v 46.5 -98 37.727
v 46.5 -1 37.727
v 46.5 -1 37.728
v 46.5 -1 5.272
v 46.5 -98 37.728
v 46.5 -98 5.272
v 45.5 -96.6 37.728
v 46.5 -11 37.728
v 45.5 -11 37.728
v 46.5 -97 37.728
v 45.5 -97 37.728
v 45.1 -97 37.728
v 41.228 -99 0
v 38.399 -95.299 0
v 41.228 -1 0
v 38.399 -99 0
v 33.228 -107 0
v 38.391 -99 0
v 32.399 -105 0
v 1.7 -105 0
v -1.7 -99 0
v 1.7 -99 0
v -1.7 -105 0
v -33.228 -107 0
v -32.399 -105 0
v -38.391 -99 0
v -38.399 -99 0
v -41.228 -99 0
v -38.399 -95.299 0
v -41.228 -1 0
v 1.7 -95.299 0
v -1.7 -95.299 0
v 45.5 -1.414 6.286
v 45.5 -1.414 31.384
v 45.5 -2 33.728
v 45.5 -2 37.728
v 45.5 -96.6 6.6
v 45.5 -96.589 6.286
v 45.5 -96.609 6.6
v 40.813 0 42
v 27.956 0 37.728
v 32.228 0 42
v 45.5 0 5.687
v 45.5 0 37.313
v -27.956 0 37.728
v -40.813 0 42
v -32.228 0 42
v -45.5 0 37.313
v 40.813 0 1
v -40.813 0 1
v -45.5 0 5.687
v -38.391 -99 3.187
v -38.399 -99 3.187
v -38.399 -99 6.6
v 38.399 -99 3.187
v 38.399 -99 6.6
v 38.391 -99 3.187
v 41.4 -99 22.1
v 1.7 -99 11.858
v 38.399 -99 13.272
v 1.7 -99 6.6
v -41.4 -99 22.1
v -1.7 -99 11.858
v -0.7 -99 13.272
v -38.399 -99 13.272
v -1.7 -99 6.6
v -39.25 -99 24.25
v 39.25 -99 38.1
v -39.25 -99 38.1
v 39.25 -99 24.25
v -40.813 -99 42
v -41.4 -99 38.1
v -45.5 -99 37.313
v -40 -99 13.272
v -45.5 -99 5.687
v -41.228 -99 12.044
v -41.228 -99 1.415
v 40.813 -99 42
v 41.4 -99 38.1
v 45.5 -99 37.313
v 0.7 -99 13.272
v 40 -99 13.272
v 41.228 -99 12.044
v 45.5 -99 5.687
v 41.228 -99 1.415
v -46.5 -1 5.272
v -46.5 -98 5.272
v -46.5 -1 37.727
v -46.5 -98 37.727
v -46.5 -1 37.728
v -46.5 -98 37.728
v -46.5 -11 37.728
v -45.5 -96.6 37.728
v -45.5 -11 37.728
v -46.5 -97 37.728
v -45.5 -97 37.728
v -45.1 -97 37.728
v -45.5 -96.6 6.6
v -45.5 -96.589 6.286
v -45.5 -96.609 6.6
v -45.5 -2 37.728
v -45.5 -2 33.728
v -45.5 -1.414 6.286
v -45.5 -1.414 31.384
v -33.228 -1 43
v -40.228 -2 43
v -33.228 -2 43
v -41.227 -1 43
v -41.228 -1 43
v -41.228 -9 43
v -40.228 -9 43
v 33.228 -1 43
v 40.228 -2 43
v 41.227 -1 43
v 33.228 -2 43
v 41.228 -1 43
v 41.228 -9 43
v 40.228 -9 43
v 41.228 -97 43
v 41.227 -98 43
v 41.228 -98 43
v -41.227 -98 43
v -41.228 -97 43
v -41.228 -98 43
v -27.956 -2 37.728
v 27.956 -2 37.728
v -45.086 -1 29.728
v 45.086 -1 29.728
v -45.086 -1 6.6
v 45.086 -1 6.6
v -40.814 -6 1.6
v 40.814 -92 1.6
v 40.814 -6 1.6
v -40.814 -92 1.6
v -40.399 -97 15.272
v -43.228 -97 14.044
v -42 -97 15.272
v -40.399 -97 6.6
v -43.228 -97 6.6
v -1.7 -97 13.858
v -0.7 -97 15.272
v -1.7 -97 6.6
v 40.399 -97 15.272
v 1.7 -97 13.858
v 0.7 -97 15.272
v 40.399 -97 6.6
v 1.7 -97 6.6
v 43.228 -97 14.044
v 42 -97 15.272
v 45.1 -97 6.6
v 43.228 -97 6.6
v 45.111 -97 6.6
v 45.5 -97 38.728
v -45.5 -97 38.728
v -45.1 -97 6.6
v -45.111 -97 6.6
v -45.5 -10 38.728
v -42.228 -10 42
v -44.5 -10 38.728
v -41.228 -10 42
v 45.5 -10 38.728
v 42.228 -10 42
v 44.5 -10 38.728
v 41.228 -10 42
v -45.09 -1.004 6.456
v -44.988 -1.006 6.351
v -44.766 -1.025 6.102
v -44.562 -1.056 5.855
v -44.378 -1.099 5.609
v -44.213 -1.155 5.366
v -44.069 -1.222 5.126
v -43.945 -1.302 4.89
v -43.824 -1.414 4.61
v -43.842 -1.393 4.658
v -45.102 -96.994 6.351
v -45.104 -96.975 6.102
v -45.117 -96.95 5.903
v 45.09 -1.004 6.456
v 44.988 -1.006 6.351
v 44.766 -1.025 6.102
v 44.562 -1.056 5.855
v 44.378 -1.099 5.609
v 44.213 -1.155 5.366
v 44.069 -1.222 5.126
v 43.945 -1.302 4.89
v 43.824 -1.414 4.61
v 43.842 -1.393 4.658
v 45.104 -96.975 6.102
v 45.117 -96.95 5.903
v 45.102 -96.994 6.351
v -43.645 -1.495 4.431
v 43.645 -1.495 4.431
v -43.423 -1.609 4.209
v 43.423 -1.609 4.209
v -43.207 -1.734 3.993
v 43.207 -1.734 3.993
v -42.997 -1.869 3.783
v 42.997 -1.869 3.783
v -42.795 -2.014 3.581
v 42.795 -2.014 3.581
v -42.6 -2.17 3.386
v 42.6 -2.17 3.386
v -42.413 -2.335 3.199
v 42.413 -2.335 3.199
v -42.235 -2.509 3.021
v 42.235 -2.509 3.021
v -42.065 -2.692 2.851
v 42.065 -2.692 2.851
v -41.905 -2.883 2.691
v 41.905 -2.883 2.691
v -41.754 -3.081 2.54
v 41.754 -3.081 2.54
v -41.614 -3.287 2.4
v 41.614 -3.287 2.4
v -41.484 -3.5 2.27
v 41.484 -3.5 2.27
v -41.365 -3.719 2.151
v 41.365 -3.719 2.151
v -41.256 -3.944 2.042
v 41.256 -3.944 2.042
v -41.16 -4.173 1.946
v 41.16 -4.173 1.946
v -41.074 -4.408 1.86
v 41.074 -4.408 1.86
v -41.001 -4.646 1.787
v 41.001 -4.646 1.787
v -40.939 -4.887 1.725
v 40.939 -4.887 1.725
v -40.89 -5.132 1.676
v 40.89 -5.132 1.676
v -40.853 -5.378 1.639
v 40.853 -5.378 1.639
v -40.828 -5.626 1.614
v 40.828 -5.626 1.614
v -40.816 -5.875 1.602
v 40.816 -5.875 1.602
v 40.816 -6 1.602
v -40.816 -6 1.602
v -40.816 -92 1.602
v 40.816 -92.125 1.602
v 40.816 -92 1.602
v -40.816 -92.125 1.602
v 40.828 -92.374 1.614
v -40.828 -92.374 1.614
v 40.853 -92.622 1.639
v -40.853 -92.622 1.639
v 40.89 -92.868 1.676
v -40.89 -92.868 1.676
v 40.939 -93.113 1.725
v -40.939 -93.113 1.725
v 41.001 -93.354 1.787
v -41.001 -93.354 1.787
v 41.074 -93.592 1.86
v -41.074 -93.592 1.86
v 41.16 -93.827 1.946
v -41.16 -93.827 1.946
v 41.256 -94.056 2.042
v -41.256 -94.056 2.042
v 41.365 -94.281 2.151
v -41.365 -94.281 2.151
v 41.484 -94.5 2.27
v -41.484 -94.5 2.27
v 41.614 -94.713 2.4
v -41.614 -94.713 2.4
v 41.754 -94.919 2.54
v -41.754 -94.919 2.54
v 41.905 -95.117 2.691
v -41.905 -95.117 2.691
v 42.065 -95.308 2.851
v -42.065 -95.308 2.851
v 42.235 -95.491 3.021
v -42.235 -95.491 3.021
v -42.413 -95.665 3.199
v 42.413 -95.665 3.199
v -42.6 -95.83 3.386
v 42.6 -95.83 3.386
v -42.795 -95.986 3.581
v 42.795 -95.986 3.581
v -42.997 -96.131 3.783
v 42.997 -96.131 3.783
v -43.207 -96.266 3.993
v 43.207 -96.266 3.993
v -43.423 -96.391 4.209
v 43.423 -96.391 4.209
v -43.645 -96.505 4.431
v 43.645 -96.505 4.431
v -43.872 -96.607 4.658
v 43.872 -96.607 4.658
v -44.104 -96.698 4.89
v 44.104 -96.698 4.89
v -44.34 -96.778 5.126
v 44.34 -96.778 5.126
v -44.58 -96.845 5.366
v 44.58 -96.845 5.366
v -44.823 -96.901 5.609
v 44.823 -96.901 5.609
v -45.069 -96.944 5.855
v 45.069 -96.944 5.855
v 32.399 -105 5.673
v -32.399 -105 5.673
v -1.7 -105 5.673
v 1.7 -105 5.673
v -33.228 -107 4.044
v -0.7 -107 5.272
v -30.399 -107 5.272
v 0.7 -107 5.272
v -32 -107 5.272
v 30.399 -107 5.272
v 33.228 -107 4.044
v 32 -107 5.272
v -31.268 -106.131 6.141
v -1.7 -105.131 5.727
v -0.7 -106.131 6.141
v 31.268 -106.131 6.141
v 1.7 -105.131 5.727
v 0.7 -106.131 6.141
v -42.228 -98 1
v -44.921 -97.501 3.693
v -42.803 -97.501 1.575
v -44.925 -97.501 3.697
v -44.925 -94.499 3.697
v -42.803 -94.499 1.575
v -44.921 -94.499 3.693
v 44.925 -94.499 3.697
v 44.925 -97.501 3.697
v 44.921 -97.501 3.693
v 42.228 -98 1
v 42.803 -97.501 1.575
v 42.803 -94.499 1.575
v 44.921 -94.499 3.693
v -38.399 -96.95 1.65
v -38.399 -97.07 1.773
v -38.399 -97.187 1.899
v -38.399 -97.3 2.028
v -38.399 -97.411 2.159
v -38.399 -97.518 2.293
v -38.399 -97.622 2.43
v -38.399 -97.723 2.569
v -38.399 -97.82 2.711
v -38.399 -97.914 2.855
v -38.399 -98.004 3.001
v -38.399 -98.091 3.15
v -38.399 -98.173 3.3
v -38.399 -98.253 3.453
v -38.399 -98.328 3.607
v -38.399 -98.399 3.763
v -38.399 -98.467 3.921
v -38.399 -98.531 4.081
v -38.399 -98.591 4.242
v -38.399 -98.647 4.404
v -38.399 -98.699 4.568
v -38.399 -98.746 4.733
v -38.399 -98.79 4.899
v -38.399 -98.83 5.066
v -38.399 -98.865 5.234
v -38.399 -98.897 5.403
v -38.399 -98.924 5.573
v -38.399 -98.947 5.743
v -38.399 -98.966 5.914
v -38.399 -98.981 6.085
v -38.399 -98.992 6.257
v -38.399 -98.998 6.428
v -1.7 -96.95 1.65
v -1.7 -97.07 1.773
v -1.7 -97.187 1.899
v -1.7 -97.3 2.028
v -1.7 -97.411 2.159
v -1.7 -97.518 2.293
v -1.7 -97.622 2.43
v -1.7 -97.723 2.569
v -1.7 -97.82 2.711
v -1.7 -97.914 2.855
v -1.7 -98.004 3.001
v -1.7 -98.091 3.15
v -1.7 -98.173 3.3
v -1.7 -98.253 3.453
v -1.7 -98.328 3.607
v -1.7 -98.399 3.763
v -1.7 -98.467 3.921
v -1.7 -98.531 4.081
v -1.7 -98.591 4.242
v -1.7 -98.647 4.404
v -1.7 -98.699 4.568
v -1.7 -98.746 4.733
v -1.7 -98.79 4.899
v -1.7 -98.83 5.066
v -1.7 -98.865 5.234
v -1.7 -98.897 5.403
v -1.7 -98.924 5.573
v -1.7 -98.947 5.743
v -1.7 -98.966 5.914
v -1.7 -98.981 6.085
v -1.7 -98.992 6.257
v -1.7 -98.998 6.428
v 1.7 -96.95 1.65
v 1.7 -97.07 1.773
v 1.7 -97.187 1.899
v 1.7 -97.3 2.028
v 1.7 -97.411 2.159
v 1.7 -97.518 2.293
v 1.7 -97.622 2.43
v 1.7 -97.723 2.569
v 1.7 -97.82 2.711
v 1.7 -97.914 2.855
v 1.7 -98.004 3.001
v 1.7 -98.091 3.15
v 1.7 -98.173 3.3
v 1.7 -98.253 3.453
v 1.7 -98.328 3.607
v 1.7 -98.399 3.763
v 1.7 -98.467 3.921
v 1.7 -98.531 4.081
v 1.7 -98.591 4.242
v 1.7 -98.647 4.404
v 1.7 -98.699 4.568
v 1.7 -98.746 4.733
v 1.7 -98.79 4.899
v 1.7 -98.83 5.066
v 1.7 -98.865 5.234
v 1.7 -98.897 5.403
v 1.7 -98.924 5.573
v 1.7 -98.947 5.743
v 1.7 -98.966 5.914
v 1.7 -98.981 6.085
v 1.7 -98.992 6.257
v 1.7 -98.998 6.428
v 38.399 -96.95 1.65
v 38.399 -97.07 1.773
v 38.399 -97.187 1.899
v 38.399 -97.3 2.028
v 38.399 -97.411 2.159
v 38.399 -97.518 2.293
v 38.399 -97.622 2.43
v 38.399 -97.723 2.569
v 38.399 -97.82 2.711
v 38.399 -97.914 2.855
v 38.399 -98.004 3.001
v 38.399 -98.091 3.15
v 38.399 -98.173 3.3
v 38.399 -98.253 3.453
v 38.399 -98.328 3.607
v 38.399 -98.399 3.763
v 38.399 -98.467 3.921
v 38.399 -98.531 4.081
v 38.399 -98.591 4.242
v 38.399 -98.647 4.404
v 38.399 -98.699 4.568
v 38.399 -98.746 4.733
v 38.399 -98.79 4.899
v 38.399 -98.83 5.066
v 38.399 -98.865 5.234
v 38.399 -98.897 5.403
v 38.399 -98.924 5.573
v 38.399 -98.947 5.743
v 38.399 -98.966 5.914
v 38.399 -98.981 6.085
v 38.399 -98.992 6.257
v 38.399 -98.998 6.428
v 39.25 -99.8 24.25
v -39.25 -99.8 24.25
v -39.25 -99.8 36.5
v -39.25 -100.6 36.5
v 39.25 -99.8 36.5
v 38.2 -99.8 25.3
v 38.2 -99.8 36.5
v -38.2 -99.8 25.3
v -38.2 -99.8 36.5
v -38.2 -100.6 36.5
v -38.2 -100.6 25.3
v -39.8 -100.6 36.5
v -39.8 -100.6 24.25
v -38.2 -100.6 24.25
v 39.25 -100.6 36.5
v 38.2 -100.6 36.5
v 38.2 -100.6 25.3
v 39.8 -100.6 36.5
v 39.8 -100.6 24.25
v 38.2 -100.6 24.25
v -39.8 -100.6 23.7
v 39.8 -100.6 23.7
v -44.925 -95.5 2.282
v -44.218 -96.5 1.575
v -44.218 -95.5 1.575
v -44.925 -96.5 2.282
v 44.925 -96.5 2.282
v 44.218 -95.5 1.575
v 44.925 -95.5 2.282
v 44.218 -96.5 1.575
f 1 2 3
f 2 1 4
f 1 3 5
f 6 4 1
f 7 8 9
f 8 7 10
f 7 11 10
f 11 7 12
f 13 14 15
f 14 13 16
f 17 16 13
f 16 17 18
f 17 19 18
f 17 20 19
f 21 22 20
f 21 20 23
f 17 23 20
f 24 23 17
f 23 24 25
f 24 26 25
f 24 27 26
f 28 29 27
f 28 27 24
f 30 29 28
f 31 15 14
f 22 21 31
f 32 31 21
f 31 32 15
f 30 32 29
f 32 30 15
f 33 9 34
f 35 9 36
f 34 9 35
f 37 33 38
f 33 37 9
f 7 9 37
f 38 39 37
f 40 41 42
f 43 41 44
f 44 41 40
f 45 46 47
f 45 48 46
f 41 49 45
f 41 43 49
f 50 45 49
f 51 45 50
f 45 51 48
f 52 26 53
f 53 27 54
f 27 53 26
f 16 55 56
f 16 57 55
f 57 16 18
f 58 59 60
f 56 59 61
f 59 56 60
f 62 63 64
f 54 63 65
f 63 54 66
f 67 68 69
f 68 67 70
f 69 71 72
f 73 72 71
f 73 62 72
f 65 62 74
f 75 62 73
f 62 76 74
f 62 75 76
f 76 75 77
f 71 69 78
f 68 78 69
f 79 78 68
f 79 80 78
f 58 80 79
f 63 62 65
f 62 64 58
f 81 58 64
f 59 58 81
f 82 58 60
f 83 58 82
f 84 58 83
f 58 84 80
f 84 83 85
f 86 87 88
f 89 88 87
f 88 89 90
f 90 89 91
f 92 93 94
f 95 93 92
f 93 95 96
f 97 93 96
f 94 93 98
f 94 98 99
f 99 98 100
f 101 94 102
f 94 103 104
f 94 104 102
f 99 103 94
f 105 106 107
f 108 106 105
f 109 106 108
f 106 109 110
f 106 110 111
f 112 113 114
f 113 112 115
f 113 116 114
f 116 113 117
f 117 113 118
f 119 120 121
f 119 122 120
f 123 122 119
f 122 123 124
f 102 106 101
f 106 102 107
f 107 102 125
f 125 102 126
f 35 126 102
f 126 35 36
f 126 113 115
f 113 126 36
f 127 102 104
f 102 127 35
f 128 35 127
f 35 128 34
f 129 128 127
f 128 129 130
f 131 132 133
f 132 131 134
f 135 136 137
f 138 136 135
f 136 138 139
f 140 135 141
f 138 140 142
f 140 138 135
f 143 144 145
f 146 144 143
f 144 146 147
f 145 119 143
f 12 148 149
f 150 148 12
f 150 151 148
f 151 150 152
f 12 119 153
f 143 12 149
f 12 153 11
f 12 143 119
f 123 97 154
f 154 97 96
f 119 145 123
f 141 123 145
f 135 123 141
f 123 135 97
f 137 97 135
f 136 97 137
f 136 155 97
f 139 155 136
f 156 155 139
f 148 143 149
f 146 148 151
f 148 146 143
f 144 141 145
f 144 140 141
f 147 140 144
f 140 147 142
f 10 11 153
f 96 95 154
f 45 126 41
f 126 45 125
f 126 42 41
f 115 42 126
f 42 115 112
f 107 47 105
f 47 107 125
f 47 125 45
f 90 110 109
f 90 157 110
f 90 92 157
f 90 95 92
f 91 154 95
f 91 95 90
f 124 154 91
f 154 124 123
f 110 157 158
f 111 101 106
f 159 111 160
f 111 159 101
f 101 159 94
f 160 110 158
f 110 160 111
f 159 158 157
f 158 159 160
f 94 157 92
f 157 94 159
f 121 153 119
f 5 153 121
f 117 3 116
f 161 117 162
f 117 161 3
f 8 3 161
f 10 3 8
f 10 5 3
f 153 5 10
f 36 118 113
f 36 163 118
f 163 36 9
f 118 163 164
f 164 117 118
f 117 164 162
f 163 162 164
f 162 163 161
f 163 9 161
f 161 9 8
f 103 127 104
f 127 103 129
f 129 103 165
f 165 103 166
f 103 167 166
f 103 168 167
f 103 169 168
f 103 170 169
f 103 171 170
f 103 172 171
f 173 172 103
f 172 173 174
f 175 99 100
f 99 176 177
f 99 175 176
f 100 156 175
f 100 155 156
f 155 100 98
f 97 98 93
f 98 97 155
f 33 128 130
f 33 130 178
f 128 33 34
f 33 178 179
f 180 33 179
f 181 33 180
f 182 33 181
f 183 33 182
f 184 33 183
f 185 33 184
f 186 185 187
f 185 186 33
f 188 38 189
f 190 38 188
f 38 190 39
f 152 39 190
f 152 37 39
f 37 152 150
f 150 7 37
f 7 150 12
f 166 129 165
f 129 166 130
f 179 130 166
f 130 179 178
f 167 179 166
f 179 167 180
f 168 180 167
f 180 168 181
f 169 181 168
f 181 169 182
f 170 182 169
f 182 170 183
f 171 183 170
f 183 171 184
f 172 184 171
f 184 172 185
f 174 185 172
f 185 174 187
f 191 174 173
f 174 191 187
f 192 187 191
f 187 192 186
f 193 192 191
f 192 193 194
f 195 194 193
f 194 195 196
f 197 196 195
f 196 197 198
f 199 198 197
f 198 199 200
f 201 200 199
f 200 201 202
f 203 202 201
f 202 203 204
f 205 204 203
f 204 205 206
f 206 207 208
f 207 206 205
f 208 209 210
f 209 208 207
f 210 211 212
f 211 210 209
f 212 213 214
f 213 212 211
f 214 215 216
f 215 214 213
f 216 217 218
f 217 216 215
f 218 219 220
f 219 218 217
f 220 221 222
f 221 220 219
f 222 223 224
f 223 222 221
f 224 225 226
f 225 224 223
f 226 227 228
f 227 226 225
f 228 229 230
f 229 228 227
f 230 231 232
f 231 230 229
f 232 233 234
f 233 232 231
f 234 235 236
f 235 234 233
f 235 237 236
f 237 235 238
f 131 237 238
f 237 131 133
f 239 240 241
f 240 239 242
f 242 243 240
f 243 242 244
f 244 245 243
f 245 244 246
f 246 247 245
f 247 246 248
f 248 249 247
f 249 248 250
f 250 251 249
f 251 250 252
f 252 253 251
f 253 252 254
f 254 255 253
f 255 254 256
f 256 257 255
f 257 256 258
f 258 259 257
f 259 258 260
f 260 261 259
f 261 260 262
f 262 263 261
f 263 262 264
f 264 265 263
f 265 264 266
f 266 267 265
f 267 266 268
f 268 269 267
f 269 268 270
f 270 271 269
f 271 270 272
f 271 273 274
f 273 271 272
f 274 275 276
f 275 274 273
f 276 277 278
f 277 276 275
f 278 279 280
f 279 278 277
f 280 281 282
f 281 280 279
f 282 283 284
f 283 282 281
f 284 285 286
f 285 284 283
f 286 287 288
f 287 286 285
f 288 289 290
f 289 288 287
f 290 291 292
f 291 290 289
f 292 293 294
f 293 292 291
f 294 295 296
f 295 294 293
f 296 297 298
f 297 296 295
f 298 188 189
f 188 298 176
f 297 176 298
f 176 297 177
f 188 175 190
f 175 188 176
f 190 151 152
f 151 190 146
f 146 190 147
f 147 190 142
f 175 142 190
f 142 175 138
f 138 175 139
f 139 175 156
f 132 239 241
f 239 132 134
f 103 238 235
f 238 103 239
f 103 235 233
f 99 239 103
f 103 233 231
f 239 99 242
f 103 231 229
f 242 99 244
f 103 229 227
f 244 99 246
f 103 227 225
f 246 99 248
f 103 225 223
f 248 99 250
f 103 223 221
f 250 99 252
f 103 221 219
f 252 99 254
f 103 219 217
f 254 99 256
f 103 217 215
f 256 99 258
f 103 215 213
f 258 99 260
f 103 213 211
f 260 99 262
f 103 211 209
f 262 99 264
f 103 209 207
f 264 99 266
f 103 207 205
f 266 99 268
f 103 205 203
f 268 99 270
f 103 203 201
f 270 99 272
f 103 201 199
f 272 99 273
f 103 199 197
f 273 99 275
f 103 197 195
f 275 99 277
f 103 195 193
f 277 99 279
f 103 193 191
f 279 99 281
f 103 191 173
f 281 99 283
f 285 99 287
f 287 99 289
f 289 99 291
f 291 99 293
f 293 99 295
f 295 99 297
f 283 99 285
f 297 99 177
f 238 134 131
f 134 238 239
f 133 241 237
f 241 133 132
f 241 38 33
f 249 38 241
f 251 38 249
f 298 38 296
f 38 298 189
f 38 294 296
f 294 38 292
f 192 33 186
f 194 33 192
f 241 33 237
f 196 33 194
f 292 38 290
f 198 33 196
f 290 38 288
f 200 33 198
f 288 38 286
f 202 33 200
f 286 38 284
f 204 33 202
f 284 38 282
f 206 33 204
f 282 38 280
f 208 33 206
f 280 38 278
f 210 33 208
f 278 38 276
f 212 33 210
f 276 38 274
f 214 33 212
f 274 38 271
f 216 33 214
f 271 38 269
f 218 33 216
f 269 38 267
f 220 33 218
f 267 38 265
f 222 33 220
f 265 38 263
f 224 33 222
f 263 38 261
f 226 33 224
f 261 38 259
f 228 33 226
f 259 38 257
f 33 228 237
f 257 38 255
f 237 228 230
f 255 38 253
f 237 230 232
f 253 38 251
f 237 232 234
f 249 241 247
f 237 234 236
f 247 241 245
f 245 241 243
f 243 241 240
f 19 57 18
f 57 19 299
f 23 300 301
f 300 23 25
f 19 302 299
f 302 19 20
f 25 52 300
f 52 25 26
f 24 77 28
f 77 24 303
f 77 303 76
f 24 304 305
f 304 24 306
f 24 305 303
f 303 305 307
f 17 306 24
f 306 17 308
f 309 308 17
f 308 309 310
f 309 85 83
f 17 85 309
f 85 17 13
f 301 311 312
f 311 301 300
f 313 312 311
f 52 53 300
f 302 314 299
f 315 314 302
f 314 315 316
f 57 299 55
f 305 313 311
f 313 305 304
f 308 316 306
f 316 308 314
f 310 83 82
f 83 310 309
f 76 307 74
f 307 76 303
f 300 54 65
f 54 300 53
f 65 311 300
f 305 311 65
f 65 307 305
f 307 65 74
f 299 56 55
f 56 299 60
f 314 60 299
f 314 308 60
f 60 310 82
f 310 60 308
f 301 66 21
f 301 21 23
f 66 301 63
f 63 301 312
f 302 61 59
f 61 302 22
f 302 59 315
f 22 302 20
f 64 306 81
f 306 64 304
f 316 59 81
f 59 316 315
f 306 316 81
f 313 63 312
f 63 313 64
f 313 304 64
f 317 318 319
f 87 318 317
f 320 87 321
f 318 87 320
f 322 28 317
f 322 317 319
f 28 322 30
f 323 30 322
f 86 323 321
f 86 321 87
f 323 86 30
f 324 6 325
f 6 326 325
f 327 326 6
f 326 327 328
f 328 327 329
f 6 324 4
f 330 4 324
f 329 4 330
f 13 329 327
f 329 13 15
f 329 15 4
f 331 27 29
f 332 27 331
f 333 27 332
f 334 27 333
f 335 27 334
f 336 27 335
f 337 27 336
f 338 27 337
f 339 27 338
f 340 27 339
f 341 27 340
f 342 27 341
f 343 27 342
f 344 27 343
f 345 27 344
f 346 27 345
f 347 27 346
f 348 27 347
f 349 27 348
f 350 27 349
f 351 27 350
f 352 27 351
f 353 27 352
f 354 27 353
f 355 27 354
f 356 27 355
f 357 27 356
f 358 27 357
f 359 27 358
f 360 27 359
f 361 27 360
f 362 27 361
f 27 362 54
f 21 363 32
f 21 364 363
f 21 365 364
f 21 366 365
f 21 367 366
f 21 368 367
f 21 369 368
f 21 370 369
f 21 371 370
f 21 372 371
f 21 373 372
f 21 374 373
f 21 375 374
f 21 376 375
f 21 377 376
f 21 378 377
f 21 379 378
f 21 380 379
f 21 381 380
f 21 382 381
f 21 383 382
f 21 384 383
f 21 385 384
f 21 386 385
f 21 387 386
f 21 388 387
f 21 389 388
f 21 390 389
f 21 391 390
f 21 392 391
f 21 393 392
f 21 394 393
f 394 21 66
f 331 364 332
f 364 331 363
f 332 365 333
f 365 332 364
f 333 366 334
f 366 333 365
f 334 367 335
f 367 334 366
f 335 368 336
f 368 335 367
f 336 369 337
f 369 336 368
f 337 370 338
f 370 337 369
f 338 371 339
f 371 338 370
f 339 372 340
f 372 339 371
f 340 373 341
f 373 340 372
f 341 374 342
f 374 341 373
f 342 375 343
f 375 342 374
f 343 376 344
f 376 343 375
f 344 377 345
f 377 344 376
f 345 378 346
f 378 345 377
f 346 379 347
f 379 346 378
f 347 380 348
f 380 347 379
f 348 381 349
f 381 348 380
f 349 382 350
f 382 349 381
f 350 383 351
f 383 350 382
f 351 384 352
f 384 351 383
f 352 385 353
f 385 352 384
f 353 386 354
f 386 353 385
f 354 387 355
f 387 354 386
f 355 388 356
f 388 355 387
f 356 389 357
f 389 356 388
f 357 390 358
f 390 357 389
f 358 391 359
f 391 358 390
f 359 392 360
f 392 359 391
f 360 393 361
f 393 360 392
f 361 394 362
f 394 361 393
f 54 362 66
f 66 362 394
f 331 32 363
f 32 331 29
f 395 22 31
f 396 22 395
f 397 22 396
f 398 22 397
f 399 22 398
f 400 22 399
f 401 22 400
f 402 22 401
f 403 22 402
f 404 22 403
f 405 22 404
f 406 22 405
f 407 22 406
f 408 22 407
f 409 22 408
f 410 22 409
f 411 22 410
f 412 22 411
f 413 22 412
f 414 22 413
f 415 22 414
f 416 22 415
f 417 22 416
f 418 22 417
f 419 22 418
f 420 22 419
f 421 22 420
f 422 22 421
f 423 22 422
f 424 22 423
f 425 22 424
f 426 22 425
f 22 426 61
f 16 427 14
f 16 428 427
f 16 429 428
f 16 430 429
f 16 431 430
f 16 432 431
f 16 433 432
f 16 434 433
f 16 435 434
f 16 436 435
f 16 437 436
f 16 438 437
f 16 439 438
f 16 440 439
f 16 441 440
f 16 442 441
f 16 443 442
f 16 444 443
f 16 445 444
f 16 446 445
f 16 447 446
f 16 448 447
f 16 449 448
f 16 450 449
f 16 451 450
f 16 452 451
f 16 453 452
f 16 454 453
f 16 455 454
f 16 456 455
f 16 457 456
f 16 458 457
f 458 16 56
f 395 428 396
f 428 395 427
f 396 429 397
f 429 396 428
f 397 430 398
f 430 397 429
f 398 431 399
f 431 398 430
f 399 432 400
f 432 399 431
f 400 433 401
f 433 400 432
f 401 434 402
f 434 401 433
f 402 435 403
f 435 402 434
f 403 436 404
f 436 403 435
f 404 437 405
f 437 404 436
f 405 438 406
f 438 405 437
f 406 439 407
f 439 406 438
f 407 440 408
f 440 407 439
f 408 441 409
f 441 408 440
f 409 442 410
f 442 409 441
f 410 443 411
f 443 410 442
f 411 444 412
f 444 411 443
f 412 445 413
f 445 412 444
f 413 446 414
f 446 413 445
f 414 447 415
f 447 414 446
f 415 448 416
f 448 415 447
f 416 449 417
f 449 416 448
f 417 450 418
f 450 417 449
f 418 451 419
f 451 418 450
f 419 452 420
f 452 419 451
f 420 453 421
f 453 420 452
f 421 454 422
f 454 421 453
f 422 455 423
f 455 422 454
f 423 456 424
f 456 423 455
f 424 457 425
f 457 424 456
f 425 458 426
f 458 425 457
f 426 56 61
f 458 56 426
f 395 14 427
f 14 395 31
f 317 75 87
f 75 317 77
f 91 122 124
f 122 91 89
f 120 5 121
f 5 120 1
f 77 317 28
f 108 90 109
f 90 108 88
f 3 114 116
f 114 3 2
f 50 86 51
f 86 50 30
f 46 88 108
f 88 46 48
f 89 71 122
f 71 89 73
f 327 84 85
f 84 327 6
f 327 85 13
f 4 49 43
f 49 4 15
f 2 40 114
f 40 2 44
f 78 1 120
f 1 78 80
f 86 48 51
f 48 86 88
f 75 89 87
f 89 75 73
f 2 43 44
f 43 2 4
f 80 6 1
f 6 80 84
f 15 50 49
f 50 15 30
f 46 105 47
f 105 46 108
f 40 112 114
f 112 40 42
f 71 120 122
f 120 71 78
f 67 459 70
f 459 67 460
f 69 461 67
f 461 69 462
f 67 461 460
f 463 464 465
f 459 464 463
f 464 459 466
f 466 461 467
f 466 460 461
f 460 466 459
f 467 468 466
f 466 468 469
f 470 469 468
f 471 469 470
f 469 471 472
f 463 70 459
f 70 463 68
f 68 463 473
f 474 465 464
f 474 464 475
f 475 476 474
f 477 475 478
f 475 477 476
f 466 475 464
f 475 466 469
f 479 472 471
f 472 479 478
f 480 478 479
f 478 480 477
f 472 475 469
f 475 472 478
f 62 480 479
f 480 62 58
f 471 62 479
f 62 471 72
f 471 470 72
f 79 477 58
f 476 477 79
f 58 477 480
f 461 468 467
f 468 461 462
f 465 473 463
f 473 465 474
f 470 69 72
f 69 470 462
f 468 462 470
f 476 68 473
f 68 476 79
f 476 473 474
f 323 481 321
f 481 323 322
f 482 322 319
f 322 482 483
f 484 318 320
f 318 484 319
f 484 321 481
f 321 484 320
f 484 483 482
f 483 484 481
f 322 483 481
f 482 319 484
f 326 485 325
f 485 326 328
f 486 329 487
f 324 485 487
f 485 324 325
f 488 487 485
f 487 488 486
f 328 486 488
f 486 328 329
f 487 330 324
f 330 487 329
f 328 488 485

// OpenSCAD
// MultiBin Simple Drawer - parametric remake
// Reverse-engineered from MultiBoard's official "MultiBin Simple Drawer" STLs so that
// matching configurations reproduce the originals; every other configuration follows
// the same rules (50 mm grid per LU, identical wall, lip, label, scoop and magnet
// geometry). Paste this whole file into MakerWorld's Parametric Model Maker.
//
// Drawer orientation: X = width, Y = depth (front toward -Y), Z = height.
// Centered on X; back face at Y = 0; base at Z = 0.

/* [Size (in 50 mm layout units)] */
// Drawer width in LU
width_lu = 2; // [1:0.5:12]
// Drawer depth in LU
depth_lu = 2; // [1:0.5:12]
// Drawer height in LU
height_lu = 1; // [0.5:0.5:12]

/* [Compartments] */
// Number of width-wise sections (columns)
width_sections = 1; // [1:12]
// Number of depth-wise sections (rows)
depth_sections = 1; // [1:12]
// Divider height in LU (clamped to the wall height)
divider_height_lu = 12; // [0.5:0.5:12]

/* [Features] */
// Magnet pocket(s) in the back wall (thickens the back wall to 4 mm)
magnet = false;
// Label holder on the front face
label = "large"; // [none, small, large]

/* [Hidden] */
$fs = 0.25;
$fa = 1;
eps = 0.01;
hs  = 0.0005;   // hull-slab thickness: keeps lofted faces on their nominal planes

U  = 50;                        // one layout unit
W  = max(1, width_lu);
D  = max(1, depth_lu);
H  = max(0.5, height_lu);

OW   = U*W - 7;                 // outer width
half = OW/2;
OH   = U*H - 7;                 // outer height
WT   = OH - 5.272;              // side/back wall + divider top height
F    = -(U*D - 1);              // front wall outer face (Y)
LIPF = F - 8;                   // lip plate front face (Y)

// Feature gates: the label frame and the magnet pocket need a minimum height;
// on shorter drawers they are omitted (with a warning) instead of emitting
// broken geometry.
lab_on = (label != "none") && (OH >= 30);
mag_on = magnet && (OH >= 35.5);

floor_t   = 1.6;                // floor thickness
wall_s    = 1.0;                // side wall thickness
wall_b    = mag_on ? 4.0 : 1.0; // back wall base thickness
wall_f    = 2.0;                // front wall thickness
lean0     = WT - 8;             // back wall starts thickening to 2 mm here
lean1     = WT - 4;             // back wall reaches 2 mm here
fil_r     = 5;                  // interior floor fillet radius (front/back/dividers)
fil_cz    = floor_t + fil_r;    // fillet center height (6.6)
side_ch   = 4.686;              // interior side-wall floor chamfer leg
bot_ch    = 5.272;              // outer side bottom chamfer leg
frt_r     = 7;                  // outer front-bottom fillet radius
scoop_hw  = 2.956;              // scoop flat extends this far past the outer cell centers
brace_len = min(8*H + 2, U*D - 5);  // corner brace flange length, clamped to the depth
div_t     = 1.0;                // divider thickness
div_top   = min(WT, U*divider_height_lu - 12.272); // divider top height

n_cells = max(1, floor(W + eps));                 // full 50 mm cells across the width
cell_c  = [for (i = [0:1:n_cells-1]) (i - (n_cells-1)/2) * U];       // cell centers
cell_b  = n_cells < 2 ? [] :
          [for (i = [0:1:n_cells-2]) (cell_c[i] + cell_c[i+1]) / 2]; // cell boundaries

n_grooves = max(0, floor((WT - 3) / U + eps));    // internal 50 mm height boundaries

// Left-hand X face of every width divider. Both the dividers themselves and the
// front-bottom fillet cut read this, so they cannot drift apart.
function divider_x() =
    width_sections < 2 ? [] :
    let (cavL = -(half - wall_s), cavR = half - wall_s,
         cw = (cavR - cavL - (width_sections - 1)*div_t) / width_sections)
    [for (i = [1:1:width_sections - 1]) cavL + i*cw + (i - 1)*div_t];

label_cells = (lab_on && label == "large") ? min(2, n_cells) : 1;
lab_win  = 13.2  + 25*(label_cells-1);  // window half width
lab_chan = 14.25 + 25*(label_cells-1);  // card channel half width
lab_foot = 16.4  + 25*(label_cells-1);  // rail outboard half width at the wall face
lab_p    = 1.6;                         // frame protrusion in front of the wall face

if (label != "none" && !lab_on)
    echo("WARNING: the label holder needs a drawer at least 1 LU tall; label omitted.");
if (magnet && !mag_on)
    echo("WARNING: the magnet pocket needs a drawer at least 1 LU tall; magnet omitted.");
if (lab_on && label == "large" && n_cells < 2)
    echo("NOTE: large label needs a drawer at least 2 LU wide; using the 1-cell frame.");

// ------------------------------------------------------------------ helpers

// 2D polygon in the (Y,Z) plane extruded along +X from x0 to x1
module prismX(pts, x0, x1) {
    translate([x0, 0, 0]) rotate([90, 0, 90])
        linear_extrude(height = x1 - x0) polygon(pts);
}
// 2D polygon in the (X,Z) plane extruded along +Y from y0 to y1  (y0 < y1)
module prismY(pts, y0, y1) {
    translate([0, y1, 0]) rotate([90, 0, 0])
        linear_extrude(height = y1 - y0) polygon(pts);
}
// thin slab of an (X,Z) polygon at depth y (for hull()-based 45-degree lofts)
module slabY(pts, y) { prismY(pts, y - eps, y + eps); }
// thin slab of a (Y,Z) polygon at position x
module slabX(pts, x) { prismX(pts, x - eps, x + eps); }

// ------------------------------------------------------------------ core parts

// back wall (Y,Z) profile, including the top lean and the brace inner face
back_prof = mag_on ?
    [[0, 1], [0, OH], [-2, OH], [-4, WT], [-4, 0], [-1, 0]] :
    [[0, 1], [0, OH], [-2, OH], [-2, lean1], [-1, lean0], [-1, 0]];

module back_wall() {
    difference() {
        prismX(back_prof, -half, half);
        for (k = [1:1:n_grooves]) groove_cut(k*U);
    }
}
// the inward-jogged wall panels behind the grooves; added after the cavity cut
module groove_bumps() {
    if (!mag_on) for (k = [1:1:n_grooves]) groove_bump(k*U);
}
// (X,Z) octagon spanning x0..x1, z0..z1 with 45-degree corner chamfer legs
function oct_xz(x0, x1, z0, z1, leg) = [
    [x0, z0 + leg], [x0 + leg, z0], [x1 - leg, z0], [x1, z0 + leg],
    [x1, z1 - leg], [x1 - leg, z1], [x0 + leg, z1], [x0, z1 - leg]];

// outer groove at height zk: an octagonal recess, 1 mm deep, lofted between
// its outer-face outline and its floor outline (60-degree drafts all around)
// The 45-degree corner legs shrink with depth at 1.015 per mm (measured), the
// same law the side-wall jog windows use.
module groove_cut(zk) {
    hull() {
        prismY(oct_xz(-(half - 5), half - 5, zk - 8.5, zk + 1.5, 2.929), 0, hs);
        prismY(oct_xz(-(half - 6.732), half - 6.732, zk - 6.768, zk - 0.232, 1.914), -1 - hs, -1);
    }
}
// matching inward-jogged wall panel: the shell offset of the groove (measured)
module groove_bump(zk) {
    hull() {
        prismY(oct_xz(-(half - 4.732), half - 4.732, zk - 8.768, zk + 1.768, 3.086), -1 - hs, -1);
        prismY(oct_xz(-(half - 6.464), half - 6.464, zk - 7.036, zk + 0.036, 2.071), -2, -2 + hs);
    }
}

// side-wall jog window polygon in (Y,Z), at inset d from the outer face (d in 0..1).
// Same numbers as the back-wall groove: 60-degree drafts on every edge, and plain
// 45-degree corner chamfers with equal legs (measured from the originals).
function jog_w(zk, d) =
    let (y0 = -5 - 1.732*d,          // back edge (max y)
         y1 = F + 5 + 1.732*d,       // front edge (min y)
         zA = zk - 8.5 + 1.732*d, zB = zk + 1.5 - 1.732*d,
         leg = 2.929 - 1.015*d)
    [[y0, zA + leg], [y0 - leg, zA], [y1 + leg, zA], [y1, zA + leg],
     [y1, zB - leg], [y1 + leg, zB], [y0 - leg, zB], [y0, zB - leg]];

// one side wall (sx = +1 / -1) with its jog windows
module side_wall(sx) {
    scale([sx, 1, 1])
        difference() {
            translate([half - wall_s, F, 0]) cube([wall_s, -F, WT]);
            for (k = [1:1:n_grooves]) hull() {
                prismX(jog_w(k*U, 0), half, half + hs);
                prismX(jog_w(k*U, 1), half - 1, half - 1 + hs);
            }
        }
}
// the inward-jogged side wall panels: the shell offset of the jog window (measured).
// The back corners are 45 degrees; the front corners are cut at about 52.4 degrees
// in plan (legs 3.308 in Z against 2.550 in Y at the base), and every edge carries
// the same 60 degree draft through the 1 mm panel thickness.
function jog_in(zk, d) =
    let (y0 = -4.732 - 1.732*d,      // the whole panel sits shifted +0.268 in Y
         y1 = F + 5.268 + 1.732*d,
         zA = zk - 8.768 + 1.732*d, zB = zk + 1.768 - 1.732*d,
         leg = 3.086 - 1.015*d,
         fz  = 3.308 - 1.142*d,
         fy  = 2.550 - 0.880*d)
    [[y0, zA + leg], [y0 - leg, zA], [y1 + fy, zA], [y1, zA + fz],
     [y1, zB - fz], [y1 + fy, zB], [y0 - leg, zB], [y0, zB - leg]];
module side_jog_panels() {
    for (sx = [-1, 1]) scale([sx, 1, 1])
        for (k = [1:1:n_grooves]) hull() {
            prismX(jog_in(k*U, 0), half - 1 - hs, half - 1);
            prismX(jog_in(k*U, 1), half - 2, half - 2 + hs);
        }
}

module front_wall() { translate([-half, F, 0]) cube([OW, wall_f, OH]); }
module floor_slab() { translate([-half, F, 0]) cube([OW, -F, floor_t]); }

// back corner braces: 1 mm arm leaning 45 degrees inward, with a flange along the side
module corner_braces() {
    for (sx = [-1, 1]) scale([sx, 1, 1]) intersection() {
        // leaning band (X,Z) extruded along Y
        // The band runs 0.5 below the wall top so it overlaps the wall instead of
        // meeting it face to face; the overhang past x = half is clipped away by the
        // flange profile below, and the rest lies inside the side wall.
        prismY([[half - (OH + 1 - WT), OH + 1], [half + 0.5, WT - 0.5],
                [half - wall_s + 0.5, WT - 0.5], [half - wall_s - (OH + 1 - WT), OH + 1]],
               -(brace_len + 2), 0);
        // Bounded in Y by the flange end with its 45-degree chamfers. The profile runs
        // 1 below the wall top so the leaning band above does the clipping; ending it
        // exactly on WT made the two coincide and left a knife edge there, which
        // float32 binary STL export collapses into a non-manifold sliver.
        prismX([[1, WT - 1], [1, OH + 1], [-(brace_len - 2), OH + 1], [-brace_len, OH - 1],
                [-brace_len, WT + 1], [-(brace_len + 2), WT - 1]], 0, half);
    }
}

// ------------------------------------------------------------------ cutters

module cavity() {
    mainB = mag_on ? -4 : -2;   // rear boundary of the main cavity box
    translate([-(half - wall_s), F + wall_f, floor_t])
        cube([OW - 2*wall_s, -(F + wall_f) + mainB, OH + 10 - floor_t]);
    if (!mag_on) {
        translate([-(half - wall_s), -2, floor_t])
            cube([OW - 2*wall_s, 1, lean0 - floor_t]);
        prismX([[-1, lean0], [-2, lean1], [-2, lean0]],
               -(half - wall_s), half - wall_s);
    }
}
// solid fillet bar along X at wall face y = yw, bulging toward dir (re-added after cavity)
module fillet_barX(x0, x1, yw, dir) {
    translate([x0, yw, 0]) rotate([90, 0, 90]) linear_extrude(height = x1 - x0)
        difference() {
            polygon([[0, floor_t], [dir*fil_r, floor_t], [dir*fil_r, fil_cz], [0, fil_cz]]);
            translate([dir*fil_r, fil_cz]) circle(r = fil_r);
        }
}

// Back-wall finger scoop. On every original the flat ends 18.544 short of the side
// wall, which for whole-LU widths is identical to the outer cell centres +/-2.956.
// Driving it from the half-width instead reproduces those exactly and keeps the
// same shoulder on half-LU widths, where cell centres alone would leave the scoop
// 12.5 too narrow at each end.
module scoop_cut() {
    x1 = half - 18.544; x0 = -x1;
    rise = OH - WT + 2;
    prismY([[x0, WT], [x1, WT], [x1 + rise, WT + rise], [x0 - rise, WT + rise]], -7, 1);
}

module outer_edge_cuts() {
    // side bottom chamfers (5.272 legs)
    for (sx = [-1, 1]) scale([sx, 1, 1])
        prismY([[half - bot_ch - 1, -1], [half + 2, -1], [half + 2, bot_ch + 3], [half, bot_ch]],
               F - eps, eps);
    // back bottom chamfer (1)
    prismX([[0, 1], [2, 1], [2, -1], [-1, -1], [-1, 0]], -half - 1, half + 1);
    // Front bottom: 45-degree lead + r7 fillet across the finger-slot span, stopping
    // at the lip-gusset bands. Measured on the originals: the cut boundary follows
    // the gusset bands only, never the divider positions, so where a divider
    // overhangs its gusset the cut passes through it (see DEVIATIONS.md D5). At the
    // front wall's inner face the arc sits at z 1.701, so it takes about 0.1 off the
    // divider foot there and nothing deeper in.
    fb_stops = concat([-(half - 8.101)],
                      [for (b = cell_b) each [b - 1.7, b + 1.7]],
                      [half - 8.101]);
    for (i = [0:1:len(fb_stops)/2 - 1])
        prismX(front_bottom_cut(), fb_stops[2*i], fb_stops[2*i + 1]);
    // tilted hip chamfers where the 1 mm edge chamfers cross the 45-degree corner zones
    hip_cuts();
    // vertical corner chamfers (1 mm legs) at back and front-wall corners;
    // each cutter is a big triangle whose hypotenuse lies exactly on the chamfer face
    for (sx = [-1, 1]) scale([sx, 1, 1]) {
        translate([0, 0, -1]) linear_extrude(height = OH + 2)
            polygon([[half - 5, 4], [half + 8, 4], [half + 8, -9]]);
        translate([0, 0, -1]) linear_extrude(height = OH + 2)
            polygon([[half - 5, F - 4], [half + 8, F - 4], [half + 8, F + 9]]);
    }
    // top outer 1 mm chamfers: back wall edge (y=0) and front wall edge (y=F)
    prismX([[2, OH - 3], [2, OH + 3], [-1, OH + 3], [-1, OH], [0, OH - 1]], -half - 1, half + 1);
    prismX([[F - 3, OH + 3], [F - 3, OH - 3], [F, OH - 1], [F + 1, OH], [F + 1, OH + 3]],
           -half - 1, half + 1);
    // top corner chamfers (5.272 legs), full depth: front wall, back wall and braces
    for (sx = [-1, 1]) scale([sx, 1, 1])
        prismY([[half - bot_ch - 2, OH + 2], [half + 3, WT - 3], [half + 3, OH + 2]],
               F - 1, 1);
    // everything above OH
    translate([-half - 2, LIPF - 4, OH]) cube([OW + 4, -LIPF + 8, 10]);
}
function front_bottom_cut() =
    let (n = 32)
    concat([[F + 4.701, -1]],
           [for (i = [0:n]) let (a = -135 - i*45/n)
                [F + frt_r + frt_r*cos(a), fil_cz + frt_r*sin(a)]],
           [[F, -1]]);

// 1 mm corner-edge chamfers, tilted along the slanted corner edges of the
// bottom side chamfers and the top corner chamfers (normals (1,+/-2,1)/sqrt(6) family)
module hip_cuts() {
    ub = 0.7071 * (half - bot_ch);   // bottom corner edge, in the rotated frame
    ut = 0.7071 * (half + WT);       // top corner edge
    for (sx = [-1, 1]) scale([sx, 1, 1]) {
        // bottom edges run along (1,0,1); clipped at the wall faces, and at the
        // front also to outboard of the lip wing (which merges with no chamfer)
        intersection() {
            rotate([0, 45, 0]) linear_extrude(height = 2000, center = true)
                polygon([[ub - 1, F], [ub, F + 1], [ub + 9, F + 1], [ub + 9, F]]);
            translate([0, 0, -1]) linear_extrude(height = 20)
                polygon([[half - bot_ch, F], [half - bot_ch + 12, F + 12], [half + 20, F + 12],
                         [half + 20, F - 9], [half - bot_ch - 9, F - 9]]);
        }
        rotate([0, 45, 0]) linear_extrude(height = 2000, center = true)
            polygon([[ub - 1, 0], [ub, -1], [ub + 9, -1], [ub + 9, 0]]);
        // top edges run along (-1,0,1)
        rotate([0, -45, 0]) linear_extrude(height = 2000, center = true) {
            polygon([[ut - 1, F], [ut, F + 1], [ut + 9, F + 1], [ut + 9, F]]);
            polygon([[ut - 1, 0], [ut, -1], [ut + 9, -1], [ut + 9, 0]]);
        }
    }
}

// magnet pocket, one per cell center, cut into the back wall from y = 0
module magnet_pockets() { for (c = cell_c) translate([c, 0, 0]) magnet_pocket(); }
module magnet_pocket() {
    lower0 = [[-3.521, 7], [3.521, 7], [8.5, 11.979], [8.5, 19.021 + hs],
              [-8.5, 19.021 + hs], [-8.5, 11.979]];
    lower1 = [[-3.121, 6.6], [3.121, 6.6], [8.5, 11.979], [8.5, 19.021 + hs],
              [-8.5, 19.021 + hs], [-8.5, 11.979]];
    // upper region, split into two convex pieces so each 45-degree flare is exact:
    // A: shoulder wedge under the fixed 45-degree lines (shrinks with depth)
    A0  = [[-8.5, 19.021], [8.5, 19.021], [5.6, 21.921], [-5.6, 21.921]];
    A29 = [[-8.5, 19.021], [8.5, 19.021], [8.5, 19.022], [-8.5, 19.022]];
    // W: waist and top: constant for the first 0.4, then flaring 45 degrees
    W04 = [[-6.0, 21.521], [6.0, 21.521], [6.0, 23.986], [2.486, 27.5], [-2.486, 27.5], [-6.0, 23.986]];
    W29 = [[-8.5, 19.02], [8.5, 19.02], [8.5, 25.021], [3.521, 30], [-3.521, 30], [-8.5, 25.021]];
    prismY(lower0, -3.2, 1);                                  // straight entry body
    hull() { prismY(lower0, -1.8 - hs, -1.8); prismY(lower1, -2.2, -2.2 + hs); }
    prismY(lower1, -3.2, -2.2);
    prismY(A0, 0, 1);
    hull() { prismY(A0, 0, hs); prismY(A29, -2.9 - hs, -2.9); }
    prismY(W04, -0.4, 1);
    hull() { prismY(W04, -0.4 - hs, -0.4); prismY(W29, -2.9, -2.9 + hs); }
    prismY(W29, -3.2, -2.9);
}

// ------------------------------------------------------------------ interior adds

module floor_blends() {
    intersection() {
        union() {
            fillet_barX(-(half - wall_s), half - wall_s, -wall_b, -1);
            fillet_barX(-(half - wall_s), half - wall_s, F + wall_f, 1);
            prismY([[-(half - wall_s), fil_cz - fil_r + side_ch], [-(half - wall_s), floor_t],
                    [-(half - wall_s) + side_ch, floor_t]], F + wall_f, -wall_b);
            prismY([[half - wall_s, fil_cz - fil_r + side_ch], [half - wall_s, floor_t],
                    [half - wall_s - side_ch, floor_t]], F + wall_f, -wall_b);
            // small vertical chamfers in the cavity corners (0.414 back, 0.4 front legs),
            // fading out toward the floor blends below z = 6.6;
            // the thick magnetic back wall has square corners in the originals
            for (sx = [-1, 1]) scale([sx, 1, 1]) {
                // Back corner: the 0.414-leg chamfer web runs to the wall top, and its
                // bottom is cut off by the fade plane (normal (0.5, 0.7071, -0.5)
                // through the outer corner at z 6.286), below which the floor blends
                // take over. Both are measured off the originals.
                if (!mag_on) {
                    intersection() {   // the chamfer web, its foot cut by the fade plane
                        linear_extrude(height = WT)
                            polygon([[half - wall_s + 0.5, -wall_b + 0.5],
                                     [half - wall_s - 0.914, -wall_b + 0.5],
                                     [half - wall_s + 0.5, -wall_b - 0.914]]);
                        below_plane([half - wall_s, -wall_b - 0.414, 6.286],
                                    [0.5, 0.7071, -0.5], [0.7071, 0, 0.7071], [0.5, -0.7071, -0.5]);
                    }
                    intersection() {   // and the square corner fill beneath that plane
                        below_plane([half - wall_s, -wall_b - 0.414, 6.286],
                                    [-0.5, -0.7071, 0.5], [0.7071, 0, 0.7071], [-0.5, 0.7071, 0.5]);
                        translate([half - wall_s - 3.4, -wall_b - 3.4, 3.8])
                            cube([3.4 + 1, 3.4 + 1, 3.2]);
                    }
                }
                // Front corner: a 0.4-leg web above z 6.6 with a near-vertical fade
                // band below it (the originals twist this face slightly as it descends).
                translate([0, 0, fil_cz]) linear_extrude(height = WT - fil_cz)
                    polygon([[half - wall_s + 0.5, F + wall_f - 0.5],
                             [half - wall_s - 0.9, F + wall_f - 0.5],
                             [half - wall_s + 0.5, F + wall_f + 0.9]]);
                intersection() {
                    below_plane([half - wall_s, F + 2.411, 6.286], [-0.708, 0.704, 0.045],
                                [0.704, 0.708, 0], [-0.03186, 0.03168, -0.99688]);
                    translate([half - wall_s - 1.6, F + wall_f - 1, 5.6])
                        cube([1.6 + 1, 1 + 2.4, 1.02]);
                }
            }
        }
        translate([-half, F, 0]) cube([OW, -F, OH]);
    }
}

module dividers() {
    cavL = -(half - wall_s); cavR = half - wall_s;
    cavB = -wall_b; cavF = F + wall_f;
    // everything is clipped to the cavity so fillet bars cannot escape the walls
    intersection() {
    translate([cavL, cavF, 0]) cube([cavR - cavL, cavB - cavF, OH]);
    union() {
    if (width_sections > 1) {
        for (xl = divider_x()) {
            translate([xl, cavF, 0]) cube([div_t, cavB - cavF, div_top]);
            translate([xl, 0, 0])         divider_filletY(cavF, cavB, -1);
            translate([xl + div_t, 0, 0]) divider_filletY(cavF, cavB, 1);
            // end flares; at the back they follow the wall as it leans to 2 mm
            translate([xl + div_t/2, cavF, 0]) linear_extrude(height = div_top)
                polygon([[-div_t/2 - 0.5, 0], [div_t/2 + 0.5, 0],
                         [div_t/2, 0.5], [-div_t/2, 0.5]]);
            // the magnetic back wall is flat, so its flare runs the full height;
            // a leaning wall carries the flare back with it above lean0
            translate([xl + div_t/2, cavB, 0])
                linear_extrude(height = mag_on ? div_top : min(div_top, lean0))
                polygon([[-div_t/2 - 0.5, 0], [div_t/2 + 0.5, 0],
                         [div_t/2, -0.5], [-div_t/2, -0.5]]);
            if (!mag_on && div_top > lean1) {
                translate([xl + div_t/2, cavB - 1, lean1]) linear_extrude(height = div_top - lean1)
                    polygon([[-div_t/2 - 0.5, 0], [div_t/2 + 0.5, 0],
                             [div_t/2, -0.5], [-div_t/2, -0.5]]);
                hull() {   // transition along the 1:4 lean
                    translate([xl + div_t/2, cavB, lean0]) linear_extrude(height = eps)
                        polygon([[-div_t/2 - 0.5, 0], [div_t/2 + 0.5, 0],
                                 [div_t/2, -0.5], [-div_t/2, -0.5]]);
                    translate([xl + div_t/2, cavB - 1, lean1]) linear_extrude(height = eps)
                        polygon([[-div_t/2 - 0.5, 0], [div_t/2 + 0.5, 0],
                                 [div_t/2, -0.5], [-div_t/2, -0.5]]);
                }
            }
        }
    }
    if (depth_sections > 1) {
        // The originals place each depth divider with its BACK face on the equal
        // division line of the cavity (g212 measured), so the front compartment
        // is 1 mm shorter per divider than the others.
        cd = (cavB - cavF) / depth_sections;
        for (i = [1:1:depth_sections - 1]) {
            yf = cavB - i*cd - div_t;           // front face of divider i
            translate([cavL, yf, 0]) cube([cavR - cavL, div_t, div_top]);
            translate([0, yf, 0])         divider_barX(cavL, cavR, -1);
            translate([0, yf + div_t, 0]) divider_barX(cavL, cavR, 1);
            for (xw = [cavL, cavR]) {
                dx = (xw == cavL) ? 1 : -1;
                translate([xw, yf + div_t/2, 0]) linear_extrude(height = div_top)
                    polygon([[0, -div_t/2 - 0.5], [0, div_t/2 + 0.5],
                             [dx*0.5, div_t/2], [dx*0.5, -div_t/2]]);
            }
        }
    }
    }   // union
    }   // cavity clip
}
module divider_barX(x0, x1, dir) {
    rotate([90, 0, 90]) translate([0, 0, x0]) linear_extrude(height = x1 - x0)
        difference() {
            polygon([[0, floor_t], [dir*fil_r, floor_t], [dir*fil_r, fil_cz], [0, fil_cz]]);
            translate([dir*fil_r, fil_cz]) circle(r = fil_r);
        }
}
module divider_filletY(y0, y1, dir) {
    translate([0, y1, 0]) rotate([90, 0, 0]) linear_extrude(height = y1 - y0)
        difference() {
            polygon([[0, floor_t], [dir*fil_r, floor_t], [dir*fil_r, fil_cz], [0, fil_cz]]);
            translate([dir*fil_r, fil_cz]) circle(r = fil_r);
        }
}

// ------------------------------------------------------------------ exterior adds

// pull lip: floating plate, 45-degree wings, gussets at cell boundaries
module lip_ring2d() {
    difference() {
        polygon([[-(half - 3.272), F + 2], [half - 3.272, F + 2],
                 [half - 13.272, LIPF], [-(half - 13.272), LIPF]]);
        polygon([[-(half - 6.101), F + 2 + eps], [half - 6.101, F + 2 + eps],
                 [half - 14.101, LIPF + 2], [-(half - 14.101), LIPF + 2]]);
    }
}
module lip() {
    // plate: low profile with the 22.5-degree back slope (clipped at z = 0);
    // the wing planes also clip the plate band's outer corners
    intersection() {
        linear_extrude(height = 10) lip_ring2d();
        prismX([[LIPF - 0.2, 0], [LIPF - 0.2, 5.072], [LIPF + 0.869, 6.141],
                [LIPF + 0.869 + 6.141/0.4142, 0]],
               -half - 1, half + 1);
        below_plane([half, F, 6.772], [1, -2, 1], [1, 0, -1], [2, 1, 0]);
        scale([-1, 1, 1]) below_plane([half, F, 6.772], [1, -2, 1], [1, 0, -1], [2, 1, 0]);
    }
    // wings: their top is a single slanted plane, normal (1,-2,1)/sqrt(6),
    // through the point (half, F, 6.772) (measured on the originals)
    for (sx = [-1, 1]) scale([sx, 1, 1]) intersection() {
        linear_extrude(height = 20) lip_ring2d();
        // outboard of the finger-slot wall line (45 degrees in plan)
        translate([0, 0, -1]) linear_extrude(height = 22)
            polygon([[half - 5.101, F + 3], [half + 20, F + 3],
                     [half + 20, LIPF - 3], [half - 19.101, LIPF - 3],
                     [half - 14.101, LIPF + 2]]);
        below_plane([half, F, 6.772], [1, -2, 1], [1, 0, -1], [2, 1, 0]);
        // capped by the 45-degree plane rising from the plate's front-top edge
        below_plane([0, F, 13.272], [0, -1, 1], [1, 0, 0], [0, 1, 1]);
    }
    // gussets at internal cell boundaries: a 1.4-wide ridge band rising at
    // 45 degrees from the plate top front edge to the wall face, with
    // sqrt(2)-slope flank chamfers down to the gusset side walls
    for (b = cell_b) translate([b, 0, 0]) intersection() {
        prismX([[LIPF, 0], [LIPF, 25], [F + 2, 25], [F + 2, 0]], -1.7, 1.7);
        below_plane([0, F, 13.272], [0, -1, 1], [1, 0, 0], [0, 1, 1]);
        below_plane([0.7, F, 13.272], [1.414, -1, 1], [0, 1, 1], [-2, -1.414, 1.414]);
        below_plane([-0.7, F, 13.272], [-1.414, -1, 1], [0, 1, 1], [2, -1.414, 1.414]);
    }
}
// Half-space below the plane through p with normal n (e1, e2 span the plane).
// The box stands in for an infinite half-space, so it is sized from the model
// rather than fixed; a fixed box silently truncates features on large drawers.
bp = 2*(OW + abs(LIPF) + OH) + 200;
module below_plane(p, n, e1, e2) {
    multmatrix([[e1[0], e2[0], n[0], p[0]],
                [e1[1], e2[1], n[1], p[1]],
                [e1[2], e2[2], n[2], p[2]]])
        translate([-bp, -bp, -2*bp]) cube([2*bp, 2*bp, 2*bp]);
}

// side detent bumps on the bottom outer chamfers, near the front.
// Measured: the hull of a face trapezoid (on the plane |x| = half - 1.575)
// and a shelf trapezoid (at z = 1.575, lying on the chamfer). The originals
// carry two variants; the face bottom is 2.282 on 1-LU-tall multi-wide
// drawers and 2.565 everywhere else (see DEVIATIONS.md).
bump_zb = (H == 1 && W >= 2) ? 2.282 : 2.565;
bump_hw = 0.5 + (3.697 - bump_zb) * 0.7071;   // shelf/face top half-length
module detent_bumps() {
    for (sx = [-1, 1]) scale([sx, 1, 1]) hull() {
        // face trapezoid, thin in X (outer face exactly at half - 1.575)
        translate([half - 1.575 - hs, 0, 0]) rotate([90, 0, 90])
            linear_extrude(height = hs) polygon(
                [[F + 2.5, bump_zb], [F + 3.5, bump_zb],
                 [F + 3 + bump_hw, 3.697], [F + 3 - bump_hw, 3.697]]);
        // shelf trapezoid, thin in Z (shelf exactly at z = 1.575)
        translate([0, 0, 1.575]) linear_extrude(height = hs) polygon(
            [[half - bump_zb, F + 2.5], [half - bump_zb, F + 3.5],
             [half - 3.697, F + 3 + bump_hw], [half - 3.697, F + 3 - bump_hw]]);
    }
}

// label holder frame on the front face
module label_frame() {
    hb0 = OH - 20.9;   // hook underside chamfer start (on the wall face)
    hf0 = OH - 19.3;   // hook front face bottom
    hf1 = OH - 17.7;   // hook front face top = window bottom
    sf  = OH - 18.75;  // card slot floor
    rt  = OH - 4.9;    // rail top at the wall face (a single 45-degree chamfer from here)
    lt  = OH - 6.5;    // window ledge top
    difference() {
        union() {
            // bottom hook band, full frame width
            prismX([[F, hb0], [F - lab_p, hf0], [F - lab_p, hf1], [F - 0.8, hf1],
                    [F - 0.8, sf], [F, sf]], -lab_foot, lab_foot);
            // side rails (both layers, pre-chamfer)
            for (sx = [-1, 1]) scale([sx, 1, 1]) {
                translate([lab_chan, F - 0.8, sf]) cube([lab_foot - lab_chan, 0.8, rt - sf]);
                translate([lab_win, F - lab_p, sf]) cube([lab_foot - lab_win, lab_p - 0.8, rt - sf]);
            }
        }
        // outboard 45-degree plan chamfers
        for (sx = [-1, 1]) scale([sx, 1, 1])
            translate([0, 0, hb0 - 3]) linear_extrude(height = OH)
                polygon([[lab_foot + 1, F + 1], [lab_foot + 7, F + 1],
                         [lab_foot + 7, F - 6], [lab_foot - 6, F - 6]]);
        // Rail top chamfer: 45 degrees down toward the front, hinged at the wall face.
        // The cutter is extended along its own face line rather than offset by eps,
        // which would tilt the visible chamfer plane.
        prismX([[F + 1, rt + 1], [F - 4, rt - 4], [F - 4, rt + 8], [F + 1, rt + 8]],
               -lab_foot - 1, lab_foot + 1);
        // window ledge caps, stopping exactly on the card channel wall
        for (sx = [-1, 1]) scale([sx, 1, 1])
            translate([lab_win - eps, F - lab_p - 1, lt]) cube([lab_chan - lab_win + eps, lab_p + 1 - 0.8, OH]);
        // card channel
        translate([-lab_chan, F - 0.8, sf]) cube([2*lab_chan, 0.8 + eps, OH]);
        // window opening
        translate([-lab_win, F - lab_p - 1, hf1]) cube([2*lab_win, lab_p + 1 - 0.8 + eps, OH]);
    }
}

// ------------------------------------------------------------------ assembly

module drawer() {
    union() {
        difference() {
            union() {
                difference() {
                    union() {
                        floor_slab();
                        side_wall(1); side_wall(-1);
                        back_wall();
                        front_wall();
                    }
                    cavity();
                    scoop_cut();
                }
                corner_braces();   // lean over the cavity, so they go in after the cavity cut
                groove_bumps();    // ditto: jogged panels sit inside the cavity envelope
                side_jog_panels();
                floor_blends();
                dividers();
                lip();             // shaped by the outer edge cuts (wing roots get chamfered)
            }
            outer_edge_cuts();
            if (mag_on) magnet_pockets();
        }
        if (lab_on) label_frame();
        detent_bumps();
    }
}

drawer();
